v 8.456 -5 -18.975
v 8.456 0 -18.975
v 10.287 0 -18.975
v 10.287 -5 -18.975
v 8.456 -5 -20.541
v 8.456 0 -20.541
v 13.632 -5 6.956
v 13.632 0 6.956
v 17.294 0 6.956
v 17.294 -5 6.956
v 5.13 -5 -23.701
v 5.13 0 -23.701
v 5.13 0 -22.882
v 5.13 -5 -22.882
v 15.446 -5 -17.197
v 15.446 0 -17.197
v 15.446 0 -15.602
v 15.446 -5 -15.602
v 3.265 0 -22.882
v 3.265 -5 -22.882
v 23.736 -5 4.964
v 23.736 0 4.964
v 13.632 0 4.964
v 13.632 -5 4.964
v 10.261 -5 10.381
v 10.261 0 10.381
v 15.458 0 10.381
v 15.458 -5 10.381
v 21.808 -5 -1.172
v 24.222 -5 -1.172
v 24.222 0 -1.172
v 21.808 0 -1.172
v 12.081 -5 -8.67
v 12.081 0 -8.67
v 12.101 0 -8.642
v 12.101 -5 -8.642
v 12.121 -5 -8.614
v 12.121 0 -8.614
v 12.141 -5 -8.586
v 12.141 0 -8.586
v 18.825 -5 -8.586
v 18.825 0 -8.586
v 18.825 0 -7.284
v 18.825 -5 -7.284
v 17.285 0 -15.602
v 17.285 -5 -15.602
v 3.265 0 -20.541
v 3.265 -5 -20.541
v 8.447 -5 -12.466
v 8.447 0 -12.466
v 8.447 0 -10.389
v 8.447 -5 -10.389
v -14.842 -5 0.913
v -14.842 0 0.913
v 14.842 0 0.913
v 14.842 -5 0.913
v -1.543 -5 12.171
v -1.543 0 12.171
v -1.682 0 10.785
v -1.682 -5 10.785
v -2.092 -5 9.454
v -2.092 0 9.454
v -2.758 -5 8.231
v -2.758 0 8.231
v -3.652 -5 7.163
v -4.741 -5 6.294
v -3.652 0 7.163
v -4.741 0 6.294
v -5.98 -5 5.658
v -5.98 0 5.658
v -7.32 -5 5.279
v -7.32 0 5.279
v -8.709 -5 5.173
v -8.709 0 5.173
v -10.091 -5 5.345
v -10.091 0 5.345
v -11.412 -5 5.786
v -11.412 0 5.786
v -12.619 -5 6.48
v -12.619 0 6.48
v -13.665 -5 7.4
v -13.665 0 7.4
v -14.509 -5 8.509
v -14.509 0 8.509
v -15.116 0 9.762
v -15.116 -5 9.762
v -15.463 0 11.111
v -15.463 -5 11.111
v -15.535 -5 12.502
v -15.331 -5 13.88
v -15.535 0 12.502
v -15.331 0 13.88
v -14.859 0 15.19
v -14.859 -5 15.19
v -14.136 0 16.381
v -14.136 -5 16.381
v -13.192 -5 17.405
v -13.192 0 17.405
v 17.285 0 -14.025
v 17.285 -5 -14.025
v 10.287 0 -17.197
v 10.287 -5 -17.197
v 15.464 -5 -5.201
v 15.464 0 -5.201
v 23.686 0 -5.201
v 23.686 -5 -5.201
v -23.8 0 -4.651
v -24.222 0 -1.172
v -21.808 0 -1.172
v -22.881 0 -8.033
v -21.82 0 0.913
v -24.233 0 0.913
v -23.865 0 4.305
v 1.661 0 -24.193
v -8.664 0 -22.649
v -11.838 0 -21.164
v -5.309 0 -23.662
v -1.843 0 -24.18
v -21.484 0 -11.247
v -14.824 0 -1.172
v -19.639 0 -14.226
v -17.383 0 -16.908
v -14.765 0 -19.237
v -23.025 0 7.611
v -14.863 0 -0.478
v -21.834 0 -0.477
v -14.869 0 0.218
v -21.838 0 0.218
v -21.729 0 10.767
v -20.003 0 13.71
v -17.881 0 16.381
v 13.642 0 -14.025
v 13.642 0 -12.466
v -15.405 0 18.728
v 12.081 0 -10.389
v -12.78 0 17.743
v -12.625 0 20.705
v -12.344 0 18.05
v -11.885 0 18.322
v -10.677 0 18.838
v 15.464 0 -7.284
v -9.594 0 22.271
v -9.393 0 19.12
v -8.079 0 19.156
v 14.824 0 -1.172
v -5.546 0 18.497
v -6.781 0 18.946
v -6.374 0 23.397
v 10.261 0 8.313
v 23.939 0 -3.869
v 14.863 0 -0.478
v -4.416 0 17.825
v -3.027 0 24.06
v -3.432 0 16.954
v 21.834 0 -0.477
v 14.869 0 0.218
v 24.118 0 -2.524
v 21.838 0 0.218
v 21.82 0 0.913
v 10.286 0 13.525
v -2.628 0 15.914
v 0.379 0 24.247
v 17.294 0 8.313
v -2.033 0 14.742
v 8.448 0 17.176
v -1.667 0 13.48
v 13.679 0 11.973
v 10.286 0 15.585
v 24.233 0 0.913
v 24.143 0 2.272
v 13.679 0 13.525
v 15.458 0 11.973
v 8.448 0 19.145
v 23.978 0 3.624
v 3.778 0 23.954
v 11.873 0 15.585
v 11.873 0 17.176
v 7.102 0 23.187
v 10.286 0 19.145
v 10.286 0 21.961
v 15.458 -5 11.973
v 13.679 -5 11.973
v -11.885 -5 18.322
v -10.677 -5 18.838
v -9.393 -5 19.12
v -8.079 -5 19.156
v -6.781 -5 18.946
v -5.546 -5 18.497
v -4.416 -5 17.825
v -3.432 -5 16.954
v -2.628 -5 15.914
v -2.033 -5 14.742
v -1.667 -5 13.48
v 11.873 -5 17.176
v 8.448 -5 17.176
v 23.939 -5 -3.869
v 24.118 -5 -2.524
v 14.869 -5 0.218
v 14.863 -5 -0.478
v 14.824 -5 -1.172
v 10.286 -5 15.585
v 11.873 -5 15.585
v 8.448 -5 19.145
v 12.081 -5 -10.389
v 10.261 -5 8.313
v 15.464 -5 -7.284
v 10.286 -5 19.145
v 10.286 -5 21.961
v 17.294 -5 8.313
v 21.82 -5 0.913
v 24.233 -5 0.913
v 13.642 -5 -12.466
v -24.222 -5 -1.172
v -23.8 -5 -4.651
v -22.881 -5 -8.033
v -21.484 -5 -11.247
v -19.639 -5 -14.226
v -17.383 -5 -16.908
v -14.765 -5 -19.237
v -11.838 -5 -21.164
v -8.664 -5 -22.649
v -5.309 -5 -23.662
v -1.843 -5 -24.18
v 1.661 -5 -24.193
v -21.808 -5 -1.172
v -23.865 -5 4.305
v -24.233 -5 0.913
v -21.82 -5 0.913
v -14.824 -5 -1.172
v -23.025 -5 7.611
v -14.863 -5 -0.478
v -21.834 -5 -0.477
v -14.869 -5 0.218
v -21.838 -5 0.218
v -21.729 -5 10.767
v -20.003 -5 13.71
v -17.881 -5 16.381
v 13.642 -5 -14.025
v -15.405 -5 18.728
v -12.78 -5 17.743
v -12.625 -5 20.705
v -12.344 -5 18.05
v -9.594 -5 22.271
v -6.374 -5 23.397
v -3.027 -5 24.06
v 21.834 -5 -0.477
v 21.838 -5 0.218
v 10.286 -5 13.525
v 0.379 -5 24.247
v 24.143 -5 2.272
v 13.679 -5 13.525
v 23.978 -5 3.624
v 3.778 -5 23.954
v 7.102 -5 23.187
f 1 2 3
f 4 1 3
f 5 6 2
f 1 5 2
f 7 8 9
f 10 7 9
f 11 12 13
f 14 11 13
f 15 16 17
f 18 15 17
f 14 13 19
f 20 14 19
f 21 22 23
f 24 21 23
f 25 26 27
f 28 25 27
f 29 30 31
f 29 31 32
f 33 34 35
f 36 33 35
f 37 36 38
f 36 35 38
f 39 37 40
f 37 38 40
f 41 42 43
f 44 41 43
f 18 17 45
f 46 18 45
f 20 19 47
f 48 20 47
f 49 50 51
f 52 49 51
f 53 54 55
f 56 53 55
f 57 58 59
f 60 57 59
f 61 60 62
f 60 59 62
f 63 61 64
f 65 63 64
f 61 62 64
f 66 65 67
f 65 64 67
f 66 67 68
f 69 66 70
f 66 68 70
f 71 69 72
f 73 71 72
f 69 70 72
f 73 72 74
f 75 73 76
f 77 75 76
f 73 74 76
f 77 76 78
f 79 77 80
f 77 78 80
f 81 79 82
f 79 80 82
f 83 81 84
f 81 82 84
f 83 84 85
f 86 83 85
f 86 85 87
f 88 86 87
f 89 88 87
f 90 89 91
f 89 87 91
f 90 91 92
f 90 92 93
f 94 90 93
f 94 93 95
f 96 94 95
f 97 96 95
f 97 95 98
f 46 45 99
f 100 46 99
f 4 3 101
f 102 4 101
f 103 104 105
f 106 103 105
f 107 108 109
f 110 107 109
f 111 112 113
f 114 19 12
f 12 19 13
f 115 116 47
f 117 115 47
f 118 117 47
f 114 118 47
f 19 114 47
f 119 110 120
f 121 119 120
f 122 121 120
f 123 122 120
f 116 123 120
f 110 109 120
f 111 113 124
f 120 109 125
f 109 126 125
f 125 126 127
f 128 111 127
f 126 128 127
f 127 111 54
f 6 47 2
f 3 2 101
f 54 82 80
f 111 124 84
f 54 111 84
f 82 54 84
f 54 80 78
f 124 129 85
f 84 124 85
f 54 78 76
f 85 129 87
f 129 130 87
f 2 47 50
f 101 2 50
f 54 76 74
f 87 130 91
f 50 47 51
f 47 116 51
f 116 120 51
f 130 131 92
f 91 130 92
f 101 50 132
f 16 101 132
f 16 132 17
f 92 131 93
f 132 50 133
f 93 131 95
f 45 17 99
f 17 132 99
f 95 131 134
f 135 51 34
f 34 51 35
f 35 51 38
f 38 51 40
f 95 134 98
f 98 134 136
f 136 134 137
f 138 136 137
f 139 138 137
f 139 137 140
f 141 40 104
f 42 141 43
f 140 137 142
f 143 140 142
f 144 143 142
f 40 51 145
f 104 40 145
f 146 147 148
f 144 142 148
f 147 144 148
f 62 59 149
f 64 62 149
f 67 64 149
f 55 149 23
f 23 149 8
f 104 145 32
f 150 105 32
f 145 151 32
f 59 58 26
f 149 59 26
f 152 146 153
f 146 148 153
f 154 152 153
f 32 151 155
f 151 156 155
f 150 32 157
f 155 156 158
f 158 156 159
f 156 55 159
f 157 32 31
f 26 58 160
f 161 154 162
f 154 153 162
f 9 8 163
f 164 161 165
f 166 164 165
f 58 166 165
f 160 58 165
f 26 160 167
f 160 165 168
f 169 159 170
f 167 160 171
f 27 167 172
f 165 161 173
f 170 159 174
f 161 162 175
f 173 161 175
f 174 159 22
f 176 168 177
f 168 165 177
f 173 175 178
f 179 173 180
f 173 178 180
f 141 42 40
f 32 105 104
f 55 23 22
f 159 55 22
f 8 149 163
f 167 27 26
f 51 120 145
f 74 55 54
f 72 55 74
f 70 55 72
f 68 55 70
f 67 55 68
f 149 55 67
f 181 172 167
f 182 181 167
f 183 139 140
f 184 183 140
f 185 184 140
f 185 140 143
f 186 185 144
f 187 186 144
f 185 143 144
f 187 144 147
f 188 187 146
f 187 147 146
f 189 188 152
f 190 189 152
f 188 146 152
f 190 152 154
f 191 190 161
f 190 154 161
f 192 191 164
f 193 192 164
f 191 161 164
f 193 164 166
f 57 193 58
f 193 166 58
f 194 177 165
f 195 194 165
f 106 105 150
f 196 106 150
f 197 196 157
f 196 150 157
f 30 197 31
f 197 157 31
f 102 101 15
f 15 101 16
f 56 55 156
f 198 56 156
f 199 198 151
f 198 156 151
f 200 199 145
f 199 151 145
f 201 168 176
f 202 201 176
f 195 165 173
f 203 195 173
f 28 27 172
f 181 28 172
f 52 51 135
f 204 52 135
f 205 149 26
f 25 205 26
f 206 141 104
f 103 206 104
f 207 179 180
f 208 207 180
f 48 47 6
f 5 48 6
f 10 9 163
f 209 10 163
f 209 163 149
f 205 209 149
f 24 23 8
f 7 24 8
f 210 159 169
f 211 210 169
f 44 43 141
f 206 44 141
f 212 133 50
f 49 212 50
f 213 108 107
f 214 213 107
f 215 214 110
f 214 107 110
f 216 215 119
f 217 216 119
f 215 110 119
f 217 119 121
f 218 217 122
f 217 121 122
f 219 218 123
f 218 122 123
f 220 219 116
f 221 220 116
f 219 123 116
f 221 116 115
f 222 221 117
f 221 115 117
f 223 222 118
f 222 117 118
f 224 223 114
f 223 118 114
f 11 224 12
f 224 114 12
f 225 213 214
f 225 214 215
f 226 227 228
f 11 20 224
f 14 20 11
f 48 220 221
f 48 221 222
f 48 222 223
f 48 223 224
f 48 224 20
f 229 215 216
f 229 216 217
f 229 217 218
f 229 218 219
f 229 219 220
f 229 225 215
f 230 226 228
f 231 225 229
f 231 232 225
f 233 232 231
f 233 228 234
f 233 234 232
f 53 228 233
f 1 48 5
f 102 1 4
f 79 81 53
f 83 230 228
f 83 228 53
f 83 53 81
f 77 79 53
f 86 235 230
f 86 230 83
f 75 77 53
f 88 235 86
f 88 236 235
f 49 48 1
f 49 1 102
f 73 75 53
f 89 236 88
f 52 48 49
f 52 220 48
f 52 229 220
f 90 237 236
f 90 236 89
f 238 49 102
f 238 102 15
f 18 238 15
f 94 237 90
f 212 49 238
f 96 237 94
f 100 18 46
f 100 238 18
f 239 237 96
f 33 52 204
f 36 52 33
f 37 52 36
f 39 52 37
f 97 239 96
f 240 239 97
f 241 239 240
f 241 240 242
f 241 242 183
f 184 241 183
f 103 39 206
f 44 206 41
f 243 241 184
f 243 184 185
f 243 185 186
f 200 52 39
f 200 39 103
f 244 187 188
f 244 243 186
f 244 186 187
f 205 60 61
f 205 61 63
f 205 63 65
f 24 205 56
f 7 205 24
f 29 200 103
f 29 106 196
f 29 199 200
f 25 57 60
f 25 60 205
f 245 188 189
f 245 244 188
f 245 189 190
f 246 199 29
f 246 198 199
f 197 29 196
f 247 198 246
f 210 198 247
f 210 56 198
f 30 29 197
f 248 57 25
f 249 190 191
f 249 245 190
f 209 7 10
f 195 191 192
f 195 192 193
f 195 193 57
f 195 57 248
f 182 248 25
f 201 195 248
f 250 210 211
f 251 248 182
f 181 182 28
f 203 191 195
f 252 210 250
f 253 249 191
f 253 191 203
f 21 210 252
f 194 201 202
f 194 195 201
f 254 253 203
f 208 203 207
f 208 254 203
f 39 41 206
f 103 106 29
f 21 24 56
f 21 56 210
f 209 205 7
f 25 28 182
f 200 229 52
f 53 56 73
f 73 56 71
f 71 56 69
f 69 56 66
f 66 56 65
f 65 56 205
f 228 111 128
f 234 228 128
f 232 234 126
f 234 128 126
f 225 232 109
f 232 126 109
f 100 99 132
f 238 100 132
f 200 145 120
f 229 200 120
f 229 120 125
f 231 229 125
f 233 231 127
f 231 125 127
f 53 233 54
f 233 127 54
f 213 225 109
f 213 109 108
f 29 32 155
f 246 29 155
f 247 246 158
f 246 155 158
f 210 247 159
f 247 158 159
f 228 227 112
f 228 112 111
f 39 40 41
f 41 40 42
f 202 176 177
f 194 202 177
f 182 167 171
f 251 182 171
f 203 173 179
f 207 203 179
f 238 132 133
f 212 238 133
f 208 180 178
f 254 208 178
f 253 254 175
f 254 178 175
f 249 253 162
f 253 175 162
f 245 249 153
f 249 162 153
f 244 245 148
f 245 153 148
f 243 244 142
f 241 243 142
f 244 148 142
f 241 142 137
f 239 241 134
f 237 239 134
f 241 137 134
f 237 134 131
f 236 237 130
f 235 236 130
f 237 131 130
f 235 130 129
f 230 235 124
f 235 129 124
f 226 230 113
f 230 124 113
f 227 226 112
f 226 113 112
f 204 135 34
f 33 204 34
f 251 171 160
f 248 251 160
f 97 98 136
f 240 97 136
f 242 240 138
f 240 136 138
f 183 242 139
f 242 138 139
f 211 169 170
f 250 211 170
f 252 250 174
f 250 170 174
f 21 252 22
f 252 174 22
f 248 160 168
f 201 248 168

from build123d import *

# Parameters (mm, degrees)
F1_DEPTH = 5


with BuildPart() as f1:
    # F0 (on Front) → F1 (new body)
    with BuildSketch(Plane.XZ):
        with BuildLine():
            Line((-21.807785, -1.172308), (-24.221647, -1.172308))
            ThreePointArc((-24.221647, -1.172308), (-14.764985, -19.236884), (5.130451, -23.701075))
            Line((5.130451, -23.701075), (5.130451, -22.882067))
            Line((5.130451, -22.882067), (3.264538, -22.882067))
            Line((3.264538, -22.882067), (3.264538, -20.541335))
            Line((3.264538, -20.541335), (8.456405, -20.541335))
            Line((8.456405, -20.541335), (8.456405, -18.974984))
            Line((8.456405, -18.974984), (10.286748, -18.974984))
            Line((10.286748, -18.974984), (10.286748, -17.197439))
            Line((10.286748, -17.197439), (15.44636, -17.197439))
            Line((15.44636, -17.197439), (15.44636, -15.602398))
            Line((15.44636, -15.602398), (17.285462, -15.602398))
            Line((17.285462, -15.602398), (17.285462, -14.024785))
            Line((17.285462, -14.024785), (13.642496, -14.024785))
            Line((13.642496, -14.024785), (13.642496, -12.465751))
            Line((13.642496, -12.465751), (8.446803, -12.465751))
            Line((8.446803, -12.465751), (8.446803, -10.388738))
            Line((8.446803, -10.388738), (12.081455, -10.388738))
            Line((12.081455, -10.388738), (12.081455, -8.669803))
            Line((12.081455, -8.669803), (12.081455, -8.58615))
            Line((12.081455, -8.58615), (12.14105, -8.58615))
            Line((12.14105, -8.58615), (18.825023, -8.58615))
            Line((18.825023, -8.58615), (18.825023, -7.2836))
            Line((18.825023, -7.2836), (15.464293, -7.2836))
            Line((15.464293, -7.2836), (15.464293, -5.200631))
            Line((15.464293, -5.200631), (23.685775, -5.200631))
            ThreePointArc((23.685775, -5.200631), (24.038243, -3.197714), (24.221647, -1.172308))
            Line((24.221647, -1.172308), (21.807785, -1.172308))
            ThreePointArc((21.807785, -1.172308), (21.838886, -0.129742), (21.820174, 0.913119))
            Line((21.820174, 0.913119), (24.232802, 0.913119))
            ThreePointArc((24.232802, 0.913119), (24.070018, 2.949024), (23.736493, 4.96401))
            Line((23.736493, 4.96401), (13.632283, 4.96401))
            Line((13.632283, 4.96401), (13.632283, 6.956257))
            Line((13.632283, 6.956257), (17.293811, 6.956257))
            Line((17.293811, 6.956257), (17.293811, 8.313401))
            Line((17.293811, 8.313401), (10.260658, 8.313401))
            Line((10.260658, 8.313401), (10.260658, 10.381422))
            Line((10.260658, 10.381422), (15.457919, 10.381422))
            Line((15.457919, 10.381422), (15.457919, 11.972982))
            Line((15.457919, 11.972982), (13.678564, 11.972982))
            Line((13.678564, 11.972982), (13.678564, 13.525478))
            Line((13.678564, 13.525478), (10.285563, 13.525478))
            Line((10.285563, 13.525478), (10.285563, 15.58539))
            Line((10.285563, 15.58539), (11.87324, 15.58539))
            Line((11.87324, 15.58539), (11.87324, 17.176317))
            Line((11.87324, 17.176317), (8.44818, 17.176317))
            Line((8.44818, 17.176317), (8.44818, 19.14476))
            Line((8.44818, 19.14476), (10.285563, 19.14476))
            Line((10.285563, 19.14476), (10.285563, 21.96064))
            ThreePointArc((10.285563, 21.96064), (-12.624615, 20.704627), (-24.232802, 0.913119))
            Line((-24.232802, 0.913119), (-21.820174, 0.913119))
            ThreePointArc((-21.820174, 0.913119), (-21.838886, -0.129742), (-21.807785, -1.172308))
        make_face()
        with BuildLine():
            ThreePointArc((-14.82406, -1.172308), (-14.869774, -0.129914), (-14.84228, 0.913119))
            Line((-14.84228, 0.913119), (14.84228, 0.913119))
            ThreePointArc((14.84228, 0.913119), (14.869774, -0.129914), (14.82406, -1.172308))
            Line((14.82406, -1.172308), (-14.82406, -1.172308))
        make_face(mode=Mode.SUBTRACT)
        with BuildLine():
            ThreePointArc((-11.885257, 18.321967), (-4.965121, 18.18768), (-1.543241, 12.171281))
            ThreePointArc((-1.543241, 12.171281), (-11.41194, 5.786098), (-13.191973, 17.404759))
            ThreePointArc((-13.191973, 17.404759), (-12.564849, 17.900738), (-11.885257, 18.321967))
        make_face(mode=Mode.SUBTRACT)
        with BuildLine():
            Line((12.081455, -8.58615), (12.081455, -8.669803))
            ThreePointArc((12.081455, -8.669803), (12.111325, -8.628028), (12.14105, -8.58615))
            Line((12.14105, -8.58615), (12.081455, -8.58615))
        make_face()
    extrude(amount=F1_DEPTH)


solid = f1.part
